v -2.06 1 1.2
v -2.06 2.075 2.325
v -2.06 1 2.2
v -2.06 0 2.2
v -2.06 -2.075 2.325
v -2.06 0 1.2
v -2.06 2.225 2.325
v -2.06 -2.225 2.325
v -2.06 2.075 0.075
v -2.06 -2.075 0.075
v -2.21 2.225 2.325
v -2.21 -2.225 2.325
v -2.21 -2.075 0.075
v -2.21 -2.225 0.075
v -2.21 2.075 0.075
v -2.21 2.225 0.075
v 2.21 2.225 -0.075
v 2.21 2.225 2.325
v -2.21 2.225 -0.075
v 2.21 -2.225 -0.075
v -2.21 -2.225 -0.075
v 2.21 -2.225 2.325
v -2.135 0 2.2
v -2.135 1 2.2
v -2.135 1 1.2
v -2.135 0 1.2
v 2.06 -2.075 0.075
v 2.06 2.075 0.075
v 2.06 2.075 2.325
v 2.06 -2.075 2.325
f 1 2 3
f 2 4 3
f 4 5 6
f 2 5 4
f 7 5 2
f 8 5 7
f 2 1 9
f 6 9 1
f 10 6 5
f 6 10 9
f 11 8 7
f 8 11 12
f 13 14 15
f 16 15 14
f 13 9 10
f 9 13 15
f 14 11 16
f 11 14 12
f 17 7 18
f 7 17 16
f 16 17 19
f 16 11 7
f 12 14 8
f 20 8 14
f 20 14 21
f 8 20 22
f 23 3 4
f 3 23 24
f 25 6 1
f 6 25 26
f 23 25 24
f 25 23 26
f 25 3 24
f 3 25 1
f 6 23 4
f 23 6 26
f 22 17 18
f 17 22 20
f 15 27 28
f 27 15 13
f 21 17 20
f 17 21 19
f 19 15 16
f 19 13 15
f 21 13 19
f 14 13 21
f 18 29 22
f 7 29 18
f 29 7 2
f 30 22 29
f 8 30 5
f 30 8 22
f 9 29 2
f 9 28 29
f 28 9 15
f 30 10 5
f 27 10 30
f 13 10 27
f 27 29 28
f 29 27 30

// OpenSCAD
//#####RECAMARA PARAMETRIZABLE ########

largo=4.42;
ancho=4.45;
alto=2.25;
grosor=0.15;
cube([largo,ancho,grosor],center=true);
//####PARED XZ1 #####
translate([0,(ancho-grosor)/2,(alto+grosor)/2])
cube([largo,grosor,alto],center=true);
//####PARED XZ2 #####
translate([0,-(ancho-grosor)/2,(alto+grosor)/2])
cube([largo,grosor,alto],center=true);
//####PARED XY1 #####
translate([(largo-grosor)/2,0,(alto+grosor)/2])
cube([grosor,ancho,alto],center=true);
//####PARED XY2 #####

translate([-(largo-grosor)/2,0,(alto+grosor)/2])
difference(){
cube([grosor,ancho,alto],center=true);
//ventana
cube([]);

}
